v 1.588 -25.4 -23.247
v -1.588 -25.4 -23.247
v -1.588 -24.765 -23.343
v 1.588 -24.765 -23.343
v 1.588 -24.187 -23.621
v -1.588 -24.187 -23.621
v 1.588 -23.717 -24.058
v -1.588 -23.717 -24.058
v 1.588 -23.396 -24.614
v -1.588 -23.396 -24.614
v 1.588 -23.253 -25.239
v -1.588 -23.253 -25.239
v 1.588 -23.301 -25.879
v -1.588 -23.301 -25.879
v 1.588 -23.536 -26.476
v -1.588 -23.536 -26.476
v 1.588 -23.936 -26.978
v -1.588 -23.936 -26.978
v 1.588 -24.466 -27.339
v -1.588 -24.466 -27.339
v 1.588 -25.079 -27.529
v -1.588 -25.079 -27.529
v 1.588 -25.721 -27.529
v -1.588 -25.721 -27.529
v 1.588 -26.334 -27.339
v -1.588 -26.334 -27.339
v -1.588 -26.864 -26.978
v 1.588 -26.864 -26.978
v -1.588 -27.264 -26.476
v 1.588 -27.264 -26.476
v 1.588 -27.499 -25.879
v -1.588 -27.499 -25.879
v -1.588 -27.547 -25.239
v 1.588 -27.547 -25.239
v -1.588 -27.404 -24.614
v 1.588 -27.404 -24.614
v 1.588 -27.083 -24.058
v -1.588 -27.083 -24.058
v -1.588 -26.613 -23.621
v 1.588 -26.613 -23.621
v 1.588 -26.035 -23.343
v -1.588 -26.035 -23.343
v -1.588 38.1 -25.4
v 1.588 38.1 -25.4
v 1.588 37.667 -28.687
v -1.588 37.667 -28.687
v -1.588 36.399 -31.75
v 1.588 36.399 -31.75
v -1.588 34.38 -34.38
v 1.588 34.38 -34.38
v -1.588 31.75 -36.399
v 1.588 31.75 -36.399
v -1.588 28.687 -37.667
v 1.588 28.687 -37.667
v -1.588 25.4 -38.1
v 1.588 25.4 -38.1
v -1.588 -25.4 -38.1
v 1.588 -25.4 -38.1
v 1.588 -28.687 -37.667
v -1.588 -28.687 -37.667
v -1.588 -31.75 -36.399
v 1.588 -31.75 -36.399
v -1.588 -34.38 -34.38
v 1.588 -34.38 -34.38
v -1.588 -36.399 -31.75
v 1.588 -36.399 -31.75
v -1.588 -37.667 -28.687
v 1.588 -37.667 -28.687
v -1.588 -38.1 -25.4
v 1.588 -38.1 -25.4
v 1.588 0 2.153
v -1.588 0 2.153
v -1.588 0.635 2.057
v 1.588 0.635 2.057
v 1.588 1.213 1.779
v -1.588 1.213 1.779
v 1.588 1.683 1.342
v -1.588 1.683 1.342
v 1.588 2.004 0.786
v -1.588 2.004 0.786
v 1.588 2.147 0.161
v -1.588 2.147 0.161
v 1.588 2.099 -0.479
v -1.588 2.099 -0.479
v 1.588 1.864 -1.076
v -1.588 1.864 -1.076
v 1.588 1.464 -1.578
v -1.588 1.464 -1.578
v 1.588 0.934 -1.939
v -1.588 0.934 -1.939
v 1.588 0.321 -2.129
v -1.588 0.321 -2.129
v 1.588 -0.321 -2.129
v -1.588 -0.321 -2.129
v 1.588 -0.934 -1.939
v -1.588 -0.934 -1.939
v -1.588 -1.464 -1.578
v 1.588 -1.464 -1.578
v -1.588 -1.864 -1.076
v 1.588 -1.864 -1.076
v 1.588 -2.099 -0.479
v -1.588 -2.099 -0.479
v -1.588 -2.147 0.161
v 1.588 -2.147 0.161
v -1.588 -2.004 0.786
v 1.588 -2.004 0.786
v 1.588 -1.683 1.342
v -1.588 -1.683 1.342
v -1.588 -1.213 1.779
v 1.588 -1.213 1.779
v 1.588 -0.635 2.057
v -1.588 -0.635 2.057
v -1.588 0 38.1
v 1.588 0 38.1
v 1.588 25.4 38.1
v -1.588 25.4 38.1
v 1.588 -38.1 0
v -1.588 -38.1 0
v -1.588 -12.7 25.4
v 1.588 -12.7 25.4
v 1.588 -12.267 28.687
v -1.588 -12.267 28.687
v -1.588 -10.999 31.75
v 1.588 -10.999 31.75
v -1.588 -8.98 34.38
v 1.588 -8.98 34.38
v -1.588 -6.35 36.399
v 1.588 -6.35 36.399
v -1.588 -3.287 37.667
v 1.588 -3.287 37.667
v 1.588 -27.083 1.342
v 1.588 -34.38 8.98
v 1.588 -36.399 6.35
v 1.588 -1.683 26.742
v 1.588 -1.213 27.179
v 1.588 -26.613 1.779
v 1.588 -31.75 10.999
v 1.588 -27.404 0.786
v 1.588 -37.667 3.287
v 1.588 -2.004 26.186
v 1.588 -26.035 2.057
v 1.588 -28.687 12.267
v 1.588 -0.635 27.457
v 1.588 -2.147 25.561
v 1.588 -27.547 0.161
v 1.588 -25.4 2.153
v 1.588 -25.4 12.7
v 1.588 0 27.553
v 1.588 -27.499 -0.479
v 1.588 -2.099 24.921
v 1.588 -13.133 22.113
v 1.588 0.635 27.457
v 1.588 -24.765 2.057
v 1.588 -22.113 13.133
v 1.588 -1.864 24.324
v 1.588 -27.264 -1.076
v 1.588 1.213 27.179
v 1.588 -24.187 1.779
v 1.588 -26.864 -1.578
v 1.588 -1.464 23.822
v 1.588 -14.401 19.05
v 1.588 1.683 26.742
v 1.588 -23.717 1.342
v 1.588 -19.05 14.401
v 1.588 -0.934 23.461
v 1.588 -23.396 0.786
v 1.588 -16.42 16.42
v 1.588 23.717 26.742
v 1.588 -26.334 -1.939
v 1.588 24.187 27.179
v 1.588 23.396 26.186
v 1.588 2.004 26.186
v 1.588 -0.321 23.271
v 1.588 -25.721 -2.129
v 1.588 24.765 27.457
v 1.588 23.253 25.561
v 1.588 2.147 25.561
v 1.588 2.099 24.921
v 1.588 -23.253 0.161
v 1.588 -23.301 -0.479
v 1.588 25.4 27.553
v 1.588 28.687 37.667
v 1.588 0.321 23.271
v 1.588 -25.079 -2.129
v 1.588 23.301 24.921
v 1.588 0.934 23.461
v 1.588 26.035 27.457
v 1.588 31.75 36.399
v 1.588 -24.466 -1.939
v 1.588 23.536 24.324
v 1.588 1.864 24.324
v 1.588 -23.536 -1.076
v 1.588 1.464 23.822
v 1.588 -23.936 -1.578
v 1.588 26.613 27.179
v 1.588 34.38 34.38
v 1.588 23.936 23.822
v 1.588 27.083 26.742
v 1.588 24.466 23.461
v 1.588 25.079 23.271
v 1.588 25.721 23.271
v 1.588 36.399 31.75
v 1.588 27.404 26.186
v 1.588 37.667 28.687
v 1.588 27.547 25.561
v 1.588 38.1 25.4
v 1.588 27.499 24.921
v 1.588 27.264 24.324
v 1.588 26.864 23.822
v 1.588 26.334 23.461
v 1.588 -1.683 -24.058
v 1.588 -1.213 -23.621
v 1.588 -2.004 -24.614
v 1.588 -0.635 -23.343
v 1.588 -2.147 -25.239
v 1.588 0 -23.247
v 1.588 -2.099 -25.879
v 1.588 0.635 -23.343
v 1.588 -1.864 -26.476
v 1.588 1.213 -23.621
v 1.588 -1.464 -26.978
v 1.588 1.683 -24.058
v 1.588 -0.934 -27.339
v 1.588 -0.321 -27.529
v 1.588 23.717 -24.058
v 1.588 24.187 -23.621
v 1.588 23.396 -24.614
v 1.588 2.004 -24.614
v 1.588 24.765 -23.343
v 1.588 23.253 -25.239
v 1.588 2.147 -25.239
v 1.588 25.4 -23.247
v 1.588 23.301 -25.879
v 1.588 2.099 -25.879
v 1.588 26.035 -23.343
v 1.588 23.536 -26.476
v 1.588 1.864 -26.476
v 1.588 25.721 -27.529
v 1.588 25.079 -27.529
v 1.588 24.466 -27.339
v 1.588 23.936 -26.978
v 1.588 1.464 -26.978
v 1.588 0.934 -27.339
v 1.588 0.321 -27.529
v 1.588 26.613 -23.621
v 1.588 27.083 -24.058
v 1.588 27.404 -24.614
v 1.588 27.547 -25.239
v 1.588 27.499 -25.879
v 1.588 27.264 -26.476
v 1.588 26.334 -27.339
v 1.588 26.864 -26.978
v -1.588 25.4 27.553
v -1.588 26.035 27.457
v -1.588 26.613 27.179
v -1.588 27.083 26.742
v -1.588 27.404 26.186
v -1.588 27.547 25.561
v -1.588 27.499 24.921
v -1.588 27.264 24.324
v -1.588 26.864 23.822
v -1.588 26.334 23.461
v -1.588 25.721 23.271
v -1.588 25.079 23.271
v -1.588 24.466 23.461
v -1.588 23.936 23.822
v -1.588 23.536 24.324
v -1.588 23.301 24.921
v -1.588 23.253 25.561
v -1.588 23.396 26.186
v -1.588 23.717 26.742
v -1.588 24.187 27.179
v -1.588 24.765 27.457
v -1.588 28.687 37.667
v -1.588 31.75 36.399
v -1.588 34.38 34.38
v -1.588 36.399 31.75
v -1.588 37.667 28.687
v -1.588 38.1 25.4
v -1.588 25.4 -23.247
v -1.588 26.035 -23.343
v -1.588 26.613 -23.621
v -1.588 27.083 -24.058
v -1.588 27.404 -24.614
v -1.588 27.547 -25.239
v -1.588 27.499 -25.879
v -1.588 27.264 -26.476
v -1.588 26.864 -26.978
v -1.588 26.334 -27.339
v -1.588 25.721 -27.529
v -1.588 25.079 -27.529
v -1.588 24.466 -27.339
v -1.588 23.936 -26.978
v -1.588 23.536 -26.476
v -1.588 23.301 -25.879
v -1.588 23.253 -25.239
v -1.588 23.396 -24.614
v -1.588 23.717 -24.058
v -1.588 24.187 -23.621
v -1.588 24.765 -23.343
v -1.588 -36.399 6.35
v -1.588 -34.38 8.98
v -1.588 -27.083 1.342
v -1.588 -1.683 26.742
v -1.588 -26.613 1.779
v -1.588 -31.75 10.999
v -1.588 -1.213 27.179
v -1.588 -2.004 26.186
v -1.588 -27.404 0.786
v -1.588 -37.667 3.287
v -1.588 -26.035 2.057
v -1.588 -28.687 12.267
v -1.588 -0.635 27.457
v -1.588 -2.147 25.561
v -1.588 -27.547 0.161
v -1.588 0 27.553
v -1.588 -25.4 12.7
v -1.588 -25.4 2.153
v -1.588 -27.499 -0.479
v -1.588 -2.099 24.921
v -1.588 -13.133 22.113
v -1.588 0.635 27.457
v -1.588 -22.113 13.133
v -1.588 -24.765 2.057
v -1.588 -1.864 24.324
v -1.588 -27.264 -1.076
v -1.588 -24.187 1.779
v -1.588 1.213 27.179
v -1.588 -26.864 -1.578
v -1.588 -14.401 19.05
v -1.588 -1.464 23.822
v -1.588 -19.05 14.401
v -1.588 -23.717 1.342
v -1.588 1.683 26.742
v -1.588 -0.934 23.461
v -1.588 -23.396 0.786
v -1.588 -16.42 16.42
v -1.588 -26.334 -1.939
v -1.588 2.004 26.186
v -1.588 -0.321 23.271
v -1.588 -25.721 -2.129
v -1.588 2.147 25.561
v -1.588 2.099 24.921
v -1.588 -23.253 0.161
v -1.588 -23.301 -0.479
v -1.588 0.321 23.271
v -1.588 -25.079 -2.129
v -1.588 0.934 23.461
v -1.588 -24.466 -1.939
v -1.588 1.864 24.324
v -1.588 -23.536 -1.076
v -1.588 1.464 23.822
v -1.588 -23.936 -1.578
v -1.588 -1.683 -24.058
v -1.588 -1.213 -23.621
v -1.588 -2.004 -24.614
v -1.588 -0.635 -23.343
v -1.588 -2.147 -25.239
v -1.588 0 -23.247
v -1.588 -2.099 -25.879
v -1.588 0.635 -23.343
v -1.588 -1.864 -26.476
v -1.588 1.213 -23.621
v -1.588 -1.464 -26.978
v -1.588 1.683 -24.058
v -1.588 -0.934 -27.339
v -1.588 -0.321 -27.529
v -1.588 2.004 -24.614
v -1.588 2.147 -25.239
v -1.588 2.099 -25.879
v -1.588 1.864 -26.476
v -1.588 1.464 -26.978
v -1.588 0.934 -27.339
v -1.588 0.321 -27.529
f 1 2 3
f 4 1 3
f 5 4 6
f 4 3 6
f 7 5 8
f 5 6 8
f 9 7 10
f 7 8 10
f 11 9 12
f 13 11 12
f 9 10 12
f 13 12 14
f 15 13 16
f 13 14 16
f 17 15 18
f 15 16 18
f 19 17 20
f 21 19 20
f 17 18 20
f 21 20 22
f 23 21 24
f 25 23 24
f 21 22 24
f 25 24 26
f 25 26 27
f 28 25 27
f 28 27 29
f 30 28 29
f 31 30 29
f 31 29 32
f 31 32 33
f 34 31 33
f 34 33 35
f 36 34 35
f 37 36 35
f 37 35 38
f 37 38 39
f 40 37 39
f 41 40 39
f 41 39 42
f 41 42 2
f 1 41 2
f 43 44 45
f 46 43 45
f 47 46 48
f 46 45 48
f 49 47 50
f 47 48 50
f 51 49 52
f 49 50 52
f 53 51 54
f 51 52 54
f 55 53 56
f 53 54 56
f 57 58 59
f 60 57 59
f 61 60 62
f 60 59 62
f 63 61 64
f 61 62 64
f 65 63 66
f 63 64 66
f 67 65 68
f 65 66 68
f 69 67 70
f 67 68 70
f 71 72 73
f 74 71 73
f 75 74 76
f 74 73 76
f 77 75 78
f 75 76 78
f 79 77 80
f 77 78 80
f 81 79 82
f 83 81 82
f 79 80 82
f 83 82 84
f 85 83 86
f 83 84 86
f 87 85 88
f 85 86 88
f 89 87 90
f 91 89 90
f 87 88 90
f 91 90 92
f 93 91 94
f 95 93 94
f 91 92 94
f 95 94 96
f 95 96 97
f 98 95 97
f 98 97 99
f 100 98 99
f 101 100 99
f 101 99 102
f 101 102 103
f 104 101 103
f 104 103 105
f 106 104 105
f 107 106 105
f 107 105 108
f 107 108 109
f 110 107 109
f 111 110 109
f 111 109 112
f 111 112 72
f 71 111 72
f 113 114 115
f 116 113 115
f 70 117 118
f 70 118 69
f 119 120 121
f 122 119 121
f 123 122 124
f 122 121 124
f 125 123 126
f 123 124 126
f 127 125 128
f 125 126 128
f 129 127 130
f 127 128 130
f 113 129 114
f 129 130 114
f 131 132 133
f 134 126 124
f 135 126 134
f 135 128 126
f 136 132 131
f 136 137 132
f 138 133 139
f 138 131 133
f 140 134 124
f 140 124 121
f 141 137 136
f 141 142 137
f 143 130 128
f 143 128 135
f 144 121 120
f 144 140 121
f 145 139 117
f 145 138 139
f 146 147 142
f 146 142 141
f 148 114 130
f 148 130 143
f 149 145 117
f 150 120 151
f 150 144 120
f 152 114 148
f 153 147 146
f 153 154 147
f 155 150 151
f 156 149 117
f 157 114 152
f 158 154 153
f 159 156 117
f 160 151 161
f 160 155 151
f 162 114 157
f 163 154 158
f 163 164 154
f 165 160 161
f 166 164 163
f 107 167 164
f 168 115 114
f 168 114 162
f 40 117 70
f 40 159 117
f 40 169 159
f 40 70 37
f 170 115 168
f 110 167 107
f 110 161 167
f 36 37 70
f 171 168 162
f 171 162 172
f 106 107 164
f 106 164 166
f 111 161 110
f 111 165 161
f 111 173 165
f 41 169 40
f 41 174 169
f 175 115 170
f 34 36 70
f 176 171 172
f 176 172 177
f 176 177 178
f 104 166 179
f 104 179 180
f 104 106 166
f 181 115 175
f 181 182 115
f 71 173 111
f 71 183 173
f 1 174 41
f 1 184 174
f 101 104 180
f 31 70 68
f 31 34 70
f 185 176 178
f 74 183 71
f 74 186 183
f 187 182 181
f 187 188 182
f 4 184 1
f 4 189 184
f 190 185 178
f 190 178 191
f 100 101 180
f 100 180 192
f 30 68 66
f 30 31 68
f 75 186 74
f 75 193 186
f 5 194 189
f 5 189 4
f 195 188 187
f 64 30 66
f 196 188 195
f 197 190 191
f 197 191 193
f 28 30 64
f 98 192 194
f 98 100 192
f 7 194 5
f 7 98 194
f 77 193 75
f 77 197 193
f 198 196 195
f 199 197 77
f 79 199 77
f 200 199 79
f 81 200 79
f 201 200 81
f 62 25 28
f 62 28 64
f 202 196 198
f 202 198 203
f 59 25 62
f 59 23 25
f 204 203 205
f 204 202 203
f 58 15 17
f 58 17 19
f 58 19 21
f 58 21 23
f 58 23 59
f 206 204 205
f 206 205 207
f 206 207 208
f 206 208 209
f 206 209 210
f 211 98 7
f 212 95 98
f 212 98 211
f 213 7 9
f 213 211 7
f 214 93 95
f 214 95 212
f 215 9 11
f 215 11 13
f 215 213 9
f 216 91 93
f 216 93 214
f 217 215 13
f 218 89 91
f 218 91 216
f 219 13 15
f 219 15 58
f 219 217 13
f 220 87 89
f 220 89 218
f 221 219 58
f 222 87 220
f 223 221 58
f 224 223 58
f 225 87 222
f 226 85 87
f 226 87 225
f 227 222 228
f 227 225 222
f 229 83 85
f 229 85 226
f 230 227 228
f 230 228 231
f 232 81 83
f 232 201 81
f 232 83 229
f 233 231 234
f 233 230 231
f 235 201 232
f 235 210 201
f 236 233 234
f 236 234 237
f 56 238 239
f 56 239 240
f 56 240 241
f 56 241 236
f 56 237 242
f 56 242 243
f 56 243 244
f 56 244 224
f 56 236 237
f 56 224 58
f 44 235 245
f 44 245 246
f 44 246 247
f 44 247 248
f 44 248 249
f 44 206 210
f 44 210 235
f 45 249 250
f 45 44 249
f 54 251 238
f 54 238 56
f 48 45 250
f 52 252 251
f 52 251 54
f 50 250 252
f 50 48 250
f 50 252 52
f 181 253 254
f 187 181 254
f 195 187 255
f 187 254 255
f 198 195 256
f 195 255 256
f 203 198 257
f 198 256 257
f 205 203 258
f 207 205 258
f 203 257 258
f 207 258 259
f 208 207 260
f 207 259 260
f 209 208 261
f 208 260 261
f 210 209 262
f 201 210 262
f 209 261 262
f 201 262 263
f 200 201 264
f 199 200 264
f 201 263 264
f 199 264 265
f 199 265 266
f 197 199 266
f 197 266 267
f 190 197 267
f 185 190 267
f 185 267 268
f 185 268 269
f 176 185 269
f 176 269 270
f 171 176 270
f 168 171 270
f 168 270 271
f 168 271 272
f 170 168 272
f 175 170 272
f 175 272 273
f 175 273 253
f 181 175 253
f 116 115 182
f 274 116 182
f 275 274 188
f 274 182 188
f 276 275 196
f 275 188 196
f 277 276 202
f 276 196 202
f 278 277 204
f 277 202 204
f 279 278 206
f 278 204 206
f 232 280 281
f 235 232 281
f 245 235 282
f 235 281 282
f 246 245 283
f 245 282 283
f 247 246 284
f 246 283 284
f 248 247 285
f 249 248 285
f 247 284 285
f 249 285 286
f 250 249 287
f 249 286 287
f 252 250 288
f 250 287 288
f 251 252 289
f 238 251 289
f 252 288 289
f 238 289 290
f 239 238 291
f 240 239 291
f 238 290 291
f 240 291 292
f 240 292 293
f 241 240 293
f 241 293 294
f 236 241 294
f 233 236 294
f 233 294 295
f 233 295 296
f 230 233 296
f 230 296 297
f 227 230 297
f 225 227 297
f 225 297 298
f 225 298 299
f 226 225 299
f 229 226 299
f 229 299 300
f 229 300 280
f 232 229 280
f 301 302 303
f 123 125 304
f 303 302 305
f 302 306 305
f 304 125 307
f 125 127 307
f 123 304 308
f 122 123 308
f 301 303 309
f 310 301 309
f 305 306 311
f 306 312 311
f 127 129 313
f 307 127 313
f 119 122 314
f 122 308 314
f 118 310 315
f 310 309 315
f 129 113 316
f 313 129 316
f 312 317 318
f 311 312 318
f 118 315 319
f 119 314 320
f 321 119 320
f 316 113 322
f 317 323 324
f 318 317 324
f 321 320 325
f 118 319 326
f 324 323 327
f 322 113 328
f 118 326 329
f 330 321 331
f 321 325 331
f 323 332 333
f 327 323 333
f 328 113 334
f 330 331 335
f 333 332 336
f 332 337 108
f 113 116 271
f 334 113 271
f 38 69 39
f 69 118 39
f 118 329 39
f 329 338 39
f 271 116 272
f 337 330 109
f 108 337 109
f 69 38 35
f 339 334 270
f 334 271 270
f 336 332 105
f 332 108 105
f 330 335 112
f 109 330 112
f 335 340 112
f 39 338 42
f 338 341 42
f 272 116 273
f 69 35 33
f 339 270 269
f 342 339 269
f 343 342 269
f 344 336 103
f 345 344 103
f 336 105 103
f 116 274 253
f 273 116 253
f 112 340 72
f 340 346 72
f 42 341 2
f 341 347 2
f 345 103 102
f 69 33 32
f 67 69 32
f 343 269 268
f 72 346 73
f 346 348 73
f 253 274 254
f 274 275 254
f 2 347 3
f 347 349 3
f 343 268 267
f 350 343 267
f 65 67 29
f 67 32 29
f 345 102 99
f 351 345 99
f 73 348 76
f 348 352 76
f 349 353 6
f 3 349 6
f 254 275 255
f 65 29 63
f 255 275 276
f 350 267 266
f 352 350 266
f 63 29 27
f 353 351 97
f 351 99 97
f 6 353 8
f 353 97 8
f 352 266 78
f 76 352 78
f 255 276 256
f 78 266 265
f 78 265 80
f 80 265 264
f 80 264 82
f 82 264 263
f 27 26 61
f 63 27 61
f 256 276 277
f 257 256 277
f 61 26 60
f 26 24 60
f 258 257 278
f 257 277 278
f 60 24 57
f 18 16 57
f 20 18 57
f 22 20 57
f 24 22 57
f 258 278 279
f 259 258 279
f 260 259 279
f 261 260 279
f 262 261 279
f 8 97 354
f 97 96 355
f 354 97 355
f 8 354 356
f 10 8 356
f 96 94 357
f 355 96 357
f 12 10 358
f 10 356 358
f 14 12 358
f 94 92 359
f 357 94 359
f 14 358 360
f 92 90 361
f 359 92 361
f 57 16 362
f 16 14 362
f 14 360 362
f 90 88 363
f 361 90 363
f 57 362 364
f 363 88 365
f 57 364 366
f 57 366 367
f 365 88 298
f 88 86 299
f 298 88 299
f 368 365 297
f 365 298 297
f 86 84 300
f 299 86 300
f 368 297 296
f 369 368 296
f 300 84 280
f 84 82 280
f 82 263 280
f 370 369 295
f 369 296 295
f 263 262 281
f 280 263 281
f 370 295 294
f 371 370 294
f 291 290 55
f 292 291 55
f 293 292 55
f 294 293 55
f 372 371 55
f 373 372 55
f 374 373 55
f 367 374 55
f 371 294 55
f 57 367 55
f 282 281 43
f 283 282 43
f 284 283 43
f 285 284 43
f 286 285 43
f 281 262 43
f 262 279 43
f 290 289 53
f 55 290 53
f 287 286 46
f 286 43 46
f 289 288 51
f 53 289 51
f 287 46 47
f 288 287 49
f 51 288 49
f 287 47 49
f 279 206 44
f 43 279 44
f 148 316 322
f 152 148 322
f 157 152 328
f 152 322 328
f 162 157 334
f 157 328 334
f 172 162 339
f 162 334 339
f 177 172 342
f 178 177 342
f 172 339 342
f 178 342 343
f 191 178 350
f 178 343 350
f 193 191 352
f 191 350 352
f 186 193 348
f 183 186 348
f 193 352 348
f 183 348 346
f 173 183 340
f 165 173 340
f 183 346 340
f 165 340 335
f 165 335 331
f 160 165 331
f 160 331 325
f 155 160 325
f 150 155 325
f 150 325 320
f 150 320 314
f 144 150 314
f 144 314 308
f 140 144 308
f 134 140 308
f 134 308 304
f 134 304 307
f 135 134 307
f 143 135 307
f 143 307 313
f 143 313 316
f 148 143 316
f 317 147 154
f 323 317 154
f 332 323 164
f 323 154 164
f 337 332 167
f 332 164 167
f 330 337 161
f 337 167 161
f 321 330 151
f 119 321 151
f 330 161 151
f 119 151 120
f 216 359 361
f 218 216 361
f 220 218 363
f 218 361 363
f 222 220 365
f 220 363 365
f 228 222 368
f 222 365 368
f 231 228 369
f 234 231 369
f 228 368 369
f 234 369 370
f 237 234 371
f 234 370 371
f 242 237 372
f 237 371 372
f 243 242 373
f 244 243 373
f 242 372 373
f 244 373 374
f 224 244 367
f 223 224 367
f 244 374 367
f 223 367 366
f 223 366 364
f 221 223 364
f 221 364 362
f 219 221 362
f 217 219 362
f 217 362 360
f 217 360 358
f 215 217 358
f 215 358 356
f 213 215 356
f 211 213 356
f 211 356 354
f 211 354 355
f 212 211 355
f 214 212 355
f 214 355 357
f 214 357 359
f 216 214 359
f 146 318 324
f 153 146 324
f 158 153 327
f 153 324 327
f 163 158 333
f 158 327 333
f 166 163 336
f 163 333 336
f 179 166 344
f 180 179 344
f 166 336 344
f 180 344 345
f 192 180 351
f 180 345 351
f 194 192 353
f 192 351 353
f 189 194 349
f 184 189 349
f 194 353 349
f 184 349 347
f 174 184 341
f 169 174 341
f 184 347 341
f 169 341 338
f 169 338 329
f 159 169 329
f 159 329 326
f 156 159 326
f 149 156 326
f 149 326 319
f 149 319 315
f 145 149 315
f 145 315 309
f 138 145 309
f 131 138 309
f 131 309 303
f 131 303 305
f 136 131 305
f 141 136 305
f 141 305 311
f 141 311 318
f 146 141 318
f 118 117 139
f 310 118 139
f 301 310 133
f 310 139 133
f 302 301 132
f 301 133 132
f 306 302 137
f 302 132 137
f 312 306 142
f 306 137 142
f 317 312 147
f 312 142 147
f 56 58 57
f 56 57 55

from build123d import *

# Parameters (mm, degrees)
SKETCH1_W             = 76.2
SKETCH1_H             = 76.2
BOSS_EXTRUDE1_DEPTH   = 1.5875
F_8_CLEARANCE_HOLE1_D = 4.3053
SKETCH4_W             = 101.6
SKETCH4_H             = 101.6
CUT_EXTRUDE1_DEPTH    = 54.975


with BuildPart() as part:
    # Sketch1 → Boss-Extrude1 (new, symmetric)
    with BuildSketch(Plane(origin=(0, 0, 0), x_dir=(0, 0, -1), z_dir=(1, 0, 0))):
        Rectangle(SKETCH1_W, SKETCH1_H)
    extrude(amount=BOSS_EXTRUDE1_DEPTH, both=True)

    # #8 Clearance Hole1 (through all)
    with Locations(Plane(origin=(1.5875, 0, 0), x_dir=(0, 0, -1), z_dir=(1, 0, 0))):
        with Locations((-25.4, 25.4), (-25.4, 0), (25.4, 25.4), (0, 0), (25.4, 0), (0, -25.4), (25.4, -25.4)):
            Hole(F_8_CLEARANCE_HOLE1_D / 2)

    # Sketch4 → Cut-Extrude1 (cut, through all)
    with BuildSketch(Plane(origin=(1.5875, 0, 0), x_dir=(0, 0, -1), z_dir=(1, 0, 0))):
        Rectangle(SKETCH4_W, SKETCH4_H)
        with BuildLine():
            Line((-38.1, 0), (-38.1, 25.4))
            ThreePointArc((-38.1, 25.4), (-34.380256121, 34.380256121), (-25.4, 38.1))
            Line((-25.4, 38.1), (25.4, 38.1))
            ThreePointArc((25.4, 38.1), (34.380256121, 34.380256121), (38.1, 25.4))
            Line((38.1, 25.4), (38.1, -25.4))
            ThreePointArc((38.1, -25.4), (34.380256121, -34.380256121), (25.4, -38.1))
            Line((25.4, -38.1), (0, -38.1))
            ThreePointArc((0, -38.1), (-8.980256121, -34.380256121), (-12.7, -25.4))
            ThreePointArc((-12.7, -25.4), (-16.419743879, -16.419743879), (-25.4, -12.7))
            ThreePointArc((-25.4, -12.7), (-34.380256121, -8.980256121), (-38.1, 0))
        make_face(mode=Mode.SUBTRACT)
    extrude(amount=-CUT_EXTRUDE1_DEPTH, mode=Mode.SUBTRACT)


solid = part.part
